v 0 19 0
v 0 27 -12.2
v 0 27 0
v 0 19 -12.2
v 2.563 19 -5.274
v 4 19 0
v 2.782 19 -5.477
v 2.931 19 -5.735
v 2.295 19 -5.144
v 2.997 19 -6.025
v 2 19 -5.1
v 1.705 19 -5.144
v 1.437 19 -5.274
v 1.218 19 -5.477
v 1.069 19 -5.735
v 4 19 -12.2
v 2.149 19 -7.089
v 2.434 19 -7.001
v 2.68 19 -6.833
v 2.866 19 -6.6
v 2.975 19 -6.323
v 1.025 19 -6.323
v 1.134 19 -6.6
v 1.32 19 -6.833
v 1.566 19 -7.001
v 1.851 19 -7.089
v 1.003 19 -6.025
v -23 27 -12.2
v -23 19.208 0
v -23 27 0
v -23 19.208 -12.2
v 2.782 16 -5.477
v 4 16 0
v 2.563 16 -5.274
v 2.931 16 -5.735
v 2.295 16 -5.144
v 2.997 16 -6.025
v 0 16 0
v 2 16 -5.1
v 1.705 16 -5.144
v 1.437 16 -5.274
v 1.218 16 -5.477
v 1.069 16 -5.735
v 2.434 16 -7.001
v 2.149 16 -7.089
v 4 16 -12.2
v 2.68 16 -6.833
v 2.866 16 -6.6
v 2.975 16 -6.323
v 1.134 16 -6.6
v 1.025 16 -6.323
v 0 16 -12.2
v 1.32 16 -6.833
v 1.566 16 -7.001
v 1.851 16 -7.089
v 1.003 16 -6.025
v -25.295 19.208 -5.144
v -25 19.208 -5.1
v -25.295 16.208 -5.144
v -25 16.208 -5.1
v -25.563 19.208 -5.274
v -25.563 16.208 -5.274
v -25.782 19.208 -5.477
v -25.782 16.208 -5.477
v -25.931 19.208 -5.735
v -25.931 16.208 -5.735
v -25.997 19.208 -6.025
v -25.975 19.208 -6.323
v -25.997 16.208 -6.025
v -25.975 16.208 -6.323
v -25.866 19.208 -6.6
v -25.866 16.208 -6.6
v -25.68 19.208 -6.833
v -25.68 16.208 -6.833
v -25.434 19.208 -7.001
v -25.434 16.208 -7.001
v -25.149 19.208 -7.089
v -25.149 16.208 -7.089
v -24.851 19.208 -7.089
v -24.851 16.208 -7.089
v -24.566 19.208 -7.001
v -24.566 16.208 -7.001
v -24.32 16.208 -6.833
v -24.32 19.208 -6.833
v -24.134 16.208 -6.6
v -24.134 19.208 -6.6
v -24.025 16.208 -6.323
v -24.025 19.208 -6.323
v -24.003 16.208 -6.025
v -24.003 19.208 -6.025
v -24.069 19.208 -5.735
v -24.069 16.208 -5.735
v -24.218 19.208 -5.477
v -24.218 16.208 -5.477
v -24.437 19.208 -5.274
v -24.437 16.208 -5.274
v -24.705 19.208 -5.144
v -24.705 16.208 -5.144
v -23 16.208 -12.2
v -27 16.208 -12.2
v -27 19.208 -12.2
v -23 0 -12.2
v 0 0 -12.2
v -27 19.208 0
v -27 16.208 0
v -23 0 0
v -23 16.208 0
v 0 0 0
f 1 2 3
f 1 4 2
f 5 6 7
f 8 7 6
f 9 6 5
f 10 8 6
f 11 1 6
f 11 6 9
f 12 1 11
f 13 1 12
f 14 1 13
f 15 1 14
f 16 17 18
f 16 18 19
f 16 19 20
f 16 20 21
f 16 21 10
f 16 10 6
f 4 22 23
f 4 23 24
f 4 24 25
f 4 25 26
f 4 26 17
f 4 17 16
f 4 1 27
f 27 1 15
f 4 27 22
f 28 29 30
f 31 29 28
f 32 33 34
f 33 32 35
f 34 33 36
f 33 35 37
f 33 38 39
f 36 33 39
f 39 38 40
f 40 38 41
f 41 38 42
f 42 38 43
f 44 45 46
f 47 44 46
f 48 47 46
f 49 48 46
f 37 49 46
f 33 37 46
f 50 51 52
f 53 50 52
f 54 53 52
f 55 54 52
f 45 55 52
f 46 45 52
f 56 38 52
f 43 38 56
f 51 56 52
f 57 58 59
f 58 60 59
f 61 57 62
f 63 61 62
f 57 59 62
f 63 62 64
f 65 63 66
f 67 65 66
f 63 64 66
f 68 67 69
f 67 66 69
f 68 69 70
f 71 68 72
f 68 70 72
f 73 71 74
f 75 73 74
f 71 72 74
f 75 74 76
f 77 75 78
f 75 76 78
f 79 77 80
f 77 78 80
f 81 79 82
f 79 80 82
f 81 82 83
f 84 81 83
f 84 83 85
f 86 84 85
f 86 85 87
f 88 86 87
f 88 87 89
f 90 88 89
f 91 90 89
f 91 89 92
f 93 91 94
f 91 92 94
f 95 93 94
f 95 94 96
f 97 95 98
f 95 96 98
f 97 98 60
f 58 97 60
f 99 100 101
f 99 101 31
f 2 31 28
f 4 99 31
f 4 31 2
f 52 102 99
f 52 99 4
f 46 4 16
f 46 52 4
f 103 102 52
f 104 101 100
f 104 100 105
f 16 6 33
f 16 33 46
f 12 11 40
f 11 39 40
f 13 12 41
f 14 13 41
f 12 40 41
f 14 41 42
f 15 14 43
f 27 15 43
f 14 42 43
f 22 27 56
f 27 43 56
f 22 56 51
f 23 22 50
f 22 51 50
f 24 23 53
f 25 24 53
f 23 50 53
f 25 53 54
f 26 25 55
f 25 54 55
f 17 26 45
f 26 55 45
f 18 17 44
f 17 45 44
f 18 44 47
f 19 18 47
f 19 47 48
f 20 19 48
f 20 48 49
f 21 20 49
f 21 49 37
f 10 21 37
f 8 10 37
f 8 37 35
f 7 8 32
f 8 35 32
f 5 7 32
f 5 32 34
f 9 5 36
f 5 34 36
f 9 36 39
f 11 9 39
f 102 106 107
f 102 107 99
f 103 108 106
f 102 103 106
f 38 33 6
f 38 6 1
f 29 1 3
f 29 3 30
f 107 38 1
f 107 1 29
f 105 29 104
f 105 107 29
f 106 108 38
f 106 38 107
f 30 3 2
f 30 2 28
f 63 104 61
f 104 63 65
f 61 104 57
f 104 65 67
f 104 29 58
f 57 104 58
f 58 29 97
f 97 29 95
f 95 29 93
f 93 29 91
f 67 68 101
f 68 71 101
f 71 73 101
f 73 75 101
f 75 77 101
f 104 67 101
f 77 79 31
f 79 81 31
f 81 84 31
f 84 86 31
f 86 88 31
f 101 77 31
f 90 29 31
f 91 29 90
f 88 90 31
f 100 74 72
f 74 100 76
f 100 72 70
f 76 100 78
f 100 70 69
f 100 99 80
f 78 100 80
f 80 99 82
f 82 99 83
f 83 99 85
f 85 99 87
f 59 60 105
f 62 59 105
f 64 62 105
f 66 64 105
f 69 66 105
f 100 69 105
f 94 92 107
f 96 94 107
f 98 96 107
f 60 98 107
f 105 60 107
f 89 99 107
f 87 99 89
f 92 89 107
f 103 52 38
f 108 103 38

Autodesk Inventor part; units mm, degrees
ref_plane "YZ Plane" through (0, 0, 0) normal (1, 0, 0) x (0, 1, 0)
ref_plane "XZ Plane" through (0, 0, 0) normal (0, 1, 0) x (-1, 0, 0)
ref_plane "XY Plane" through (0, 0, 0) normal (0, 0, 1) x (1, 0, 0)
sketch "スケッチ1" plane through (0, 0, 0) normal (0, 1, 0) x (-1, 0, 0)
  line L0 (0, 0) -> (23, 0)
  line L1 (23, 0) -> (23, -12.2)
  line L2 (23, -12.2) -> (0, -12.2)
  line L3 (0, -12.2) -> (0, 0)
  dimension "d0" = 23
  dimension "d1" = 12.2
extrude "押し出し1" add sketch "スケッチ1" along normal blind 27
sketch "スケッチ2" plane through (0, 0, 0) normal (1, 0, 0) x (0, 0, -1)
  line L0 (0, 0) -> (0, 16)
  line L1 (0, 0) -> (0, 27) projected
  line L2 (0, 16) -> (12.2, 16)
  line L3 (12.2, 0) -> (12.2, 27) projected
  line L4 (0, 16) -> (0, 19)
  line L5 (0, 19) -> (12.2, 19)
  line L6 (12.2, 19) -> (12.2, 16)
  dimension "d4" = 16
  dimension "d5" = 3
extrude "押し出し2" add sketch "スケッチ2" along normal blind 4
sketch "スケッチ3" plane through (-23, 0, -12.2) normal (-1, 0, 0) x (0, 0, 1)
  line L0 (0, 0) -> (0, 16.2076)
  line L1 (0, 16.2076) -> (12.2, 16.2076)
  line L2 (12.2, 16.2076) -> (12.2, 19.2076)
  line L3 (12.2, 19.2076) -> (0, 19.2076)
  line L4 (0, 0) -> (0, 27) projected
  line L5 (0, 19.2076) -> (0, 16.2076)
  point P0 (12.2, 0)
  dimension "d8" = 3
extrude "押し出し3" add sketch "スケッチ3" along normal blind 4
hole "穴2" at (-25, 19.2076, -6.1) direction (0, -1, 0) diameter 2 end through all
hole "穴3" at (2, 19, -6.1) direction (0, -1, 0) diameter 2 end through all
properties part number "サーボ"
